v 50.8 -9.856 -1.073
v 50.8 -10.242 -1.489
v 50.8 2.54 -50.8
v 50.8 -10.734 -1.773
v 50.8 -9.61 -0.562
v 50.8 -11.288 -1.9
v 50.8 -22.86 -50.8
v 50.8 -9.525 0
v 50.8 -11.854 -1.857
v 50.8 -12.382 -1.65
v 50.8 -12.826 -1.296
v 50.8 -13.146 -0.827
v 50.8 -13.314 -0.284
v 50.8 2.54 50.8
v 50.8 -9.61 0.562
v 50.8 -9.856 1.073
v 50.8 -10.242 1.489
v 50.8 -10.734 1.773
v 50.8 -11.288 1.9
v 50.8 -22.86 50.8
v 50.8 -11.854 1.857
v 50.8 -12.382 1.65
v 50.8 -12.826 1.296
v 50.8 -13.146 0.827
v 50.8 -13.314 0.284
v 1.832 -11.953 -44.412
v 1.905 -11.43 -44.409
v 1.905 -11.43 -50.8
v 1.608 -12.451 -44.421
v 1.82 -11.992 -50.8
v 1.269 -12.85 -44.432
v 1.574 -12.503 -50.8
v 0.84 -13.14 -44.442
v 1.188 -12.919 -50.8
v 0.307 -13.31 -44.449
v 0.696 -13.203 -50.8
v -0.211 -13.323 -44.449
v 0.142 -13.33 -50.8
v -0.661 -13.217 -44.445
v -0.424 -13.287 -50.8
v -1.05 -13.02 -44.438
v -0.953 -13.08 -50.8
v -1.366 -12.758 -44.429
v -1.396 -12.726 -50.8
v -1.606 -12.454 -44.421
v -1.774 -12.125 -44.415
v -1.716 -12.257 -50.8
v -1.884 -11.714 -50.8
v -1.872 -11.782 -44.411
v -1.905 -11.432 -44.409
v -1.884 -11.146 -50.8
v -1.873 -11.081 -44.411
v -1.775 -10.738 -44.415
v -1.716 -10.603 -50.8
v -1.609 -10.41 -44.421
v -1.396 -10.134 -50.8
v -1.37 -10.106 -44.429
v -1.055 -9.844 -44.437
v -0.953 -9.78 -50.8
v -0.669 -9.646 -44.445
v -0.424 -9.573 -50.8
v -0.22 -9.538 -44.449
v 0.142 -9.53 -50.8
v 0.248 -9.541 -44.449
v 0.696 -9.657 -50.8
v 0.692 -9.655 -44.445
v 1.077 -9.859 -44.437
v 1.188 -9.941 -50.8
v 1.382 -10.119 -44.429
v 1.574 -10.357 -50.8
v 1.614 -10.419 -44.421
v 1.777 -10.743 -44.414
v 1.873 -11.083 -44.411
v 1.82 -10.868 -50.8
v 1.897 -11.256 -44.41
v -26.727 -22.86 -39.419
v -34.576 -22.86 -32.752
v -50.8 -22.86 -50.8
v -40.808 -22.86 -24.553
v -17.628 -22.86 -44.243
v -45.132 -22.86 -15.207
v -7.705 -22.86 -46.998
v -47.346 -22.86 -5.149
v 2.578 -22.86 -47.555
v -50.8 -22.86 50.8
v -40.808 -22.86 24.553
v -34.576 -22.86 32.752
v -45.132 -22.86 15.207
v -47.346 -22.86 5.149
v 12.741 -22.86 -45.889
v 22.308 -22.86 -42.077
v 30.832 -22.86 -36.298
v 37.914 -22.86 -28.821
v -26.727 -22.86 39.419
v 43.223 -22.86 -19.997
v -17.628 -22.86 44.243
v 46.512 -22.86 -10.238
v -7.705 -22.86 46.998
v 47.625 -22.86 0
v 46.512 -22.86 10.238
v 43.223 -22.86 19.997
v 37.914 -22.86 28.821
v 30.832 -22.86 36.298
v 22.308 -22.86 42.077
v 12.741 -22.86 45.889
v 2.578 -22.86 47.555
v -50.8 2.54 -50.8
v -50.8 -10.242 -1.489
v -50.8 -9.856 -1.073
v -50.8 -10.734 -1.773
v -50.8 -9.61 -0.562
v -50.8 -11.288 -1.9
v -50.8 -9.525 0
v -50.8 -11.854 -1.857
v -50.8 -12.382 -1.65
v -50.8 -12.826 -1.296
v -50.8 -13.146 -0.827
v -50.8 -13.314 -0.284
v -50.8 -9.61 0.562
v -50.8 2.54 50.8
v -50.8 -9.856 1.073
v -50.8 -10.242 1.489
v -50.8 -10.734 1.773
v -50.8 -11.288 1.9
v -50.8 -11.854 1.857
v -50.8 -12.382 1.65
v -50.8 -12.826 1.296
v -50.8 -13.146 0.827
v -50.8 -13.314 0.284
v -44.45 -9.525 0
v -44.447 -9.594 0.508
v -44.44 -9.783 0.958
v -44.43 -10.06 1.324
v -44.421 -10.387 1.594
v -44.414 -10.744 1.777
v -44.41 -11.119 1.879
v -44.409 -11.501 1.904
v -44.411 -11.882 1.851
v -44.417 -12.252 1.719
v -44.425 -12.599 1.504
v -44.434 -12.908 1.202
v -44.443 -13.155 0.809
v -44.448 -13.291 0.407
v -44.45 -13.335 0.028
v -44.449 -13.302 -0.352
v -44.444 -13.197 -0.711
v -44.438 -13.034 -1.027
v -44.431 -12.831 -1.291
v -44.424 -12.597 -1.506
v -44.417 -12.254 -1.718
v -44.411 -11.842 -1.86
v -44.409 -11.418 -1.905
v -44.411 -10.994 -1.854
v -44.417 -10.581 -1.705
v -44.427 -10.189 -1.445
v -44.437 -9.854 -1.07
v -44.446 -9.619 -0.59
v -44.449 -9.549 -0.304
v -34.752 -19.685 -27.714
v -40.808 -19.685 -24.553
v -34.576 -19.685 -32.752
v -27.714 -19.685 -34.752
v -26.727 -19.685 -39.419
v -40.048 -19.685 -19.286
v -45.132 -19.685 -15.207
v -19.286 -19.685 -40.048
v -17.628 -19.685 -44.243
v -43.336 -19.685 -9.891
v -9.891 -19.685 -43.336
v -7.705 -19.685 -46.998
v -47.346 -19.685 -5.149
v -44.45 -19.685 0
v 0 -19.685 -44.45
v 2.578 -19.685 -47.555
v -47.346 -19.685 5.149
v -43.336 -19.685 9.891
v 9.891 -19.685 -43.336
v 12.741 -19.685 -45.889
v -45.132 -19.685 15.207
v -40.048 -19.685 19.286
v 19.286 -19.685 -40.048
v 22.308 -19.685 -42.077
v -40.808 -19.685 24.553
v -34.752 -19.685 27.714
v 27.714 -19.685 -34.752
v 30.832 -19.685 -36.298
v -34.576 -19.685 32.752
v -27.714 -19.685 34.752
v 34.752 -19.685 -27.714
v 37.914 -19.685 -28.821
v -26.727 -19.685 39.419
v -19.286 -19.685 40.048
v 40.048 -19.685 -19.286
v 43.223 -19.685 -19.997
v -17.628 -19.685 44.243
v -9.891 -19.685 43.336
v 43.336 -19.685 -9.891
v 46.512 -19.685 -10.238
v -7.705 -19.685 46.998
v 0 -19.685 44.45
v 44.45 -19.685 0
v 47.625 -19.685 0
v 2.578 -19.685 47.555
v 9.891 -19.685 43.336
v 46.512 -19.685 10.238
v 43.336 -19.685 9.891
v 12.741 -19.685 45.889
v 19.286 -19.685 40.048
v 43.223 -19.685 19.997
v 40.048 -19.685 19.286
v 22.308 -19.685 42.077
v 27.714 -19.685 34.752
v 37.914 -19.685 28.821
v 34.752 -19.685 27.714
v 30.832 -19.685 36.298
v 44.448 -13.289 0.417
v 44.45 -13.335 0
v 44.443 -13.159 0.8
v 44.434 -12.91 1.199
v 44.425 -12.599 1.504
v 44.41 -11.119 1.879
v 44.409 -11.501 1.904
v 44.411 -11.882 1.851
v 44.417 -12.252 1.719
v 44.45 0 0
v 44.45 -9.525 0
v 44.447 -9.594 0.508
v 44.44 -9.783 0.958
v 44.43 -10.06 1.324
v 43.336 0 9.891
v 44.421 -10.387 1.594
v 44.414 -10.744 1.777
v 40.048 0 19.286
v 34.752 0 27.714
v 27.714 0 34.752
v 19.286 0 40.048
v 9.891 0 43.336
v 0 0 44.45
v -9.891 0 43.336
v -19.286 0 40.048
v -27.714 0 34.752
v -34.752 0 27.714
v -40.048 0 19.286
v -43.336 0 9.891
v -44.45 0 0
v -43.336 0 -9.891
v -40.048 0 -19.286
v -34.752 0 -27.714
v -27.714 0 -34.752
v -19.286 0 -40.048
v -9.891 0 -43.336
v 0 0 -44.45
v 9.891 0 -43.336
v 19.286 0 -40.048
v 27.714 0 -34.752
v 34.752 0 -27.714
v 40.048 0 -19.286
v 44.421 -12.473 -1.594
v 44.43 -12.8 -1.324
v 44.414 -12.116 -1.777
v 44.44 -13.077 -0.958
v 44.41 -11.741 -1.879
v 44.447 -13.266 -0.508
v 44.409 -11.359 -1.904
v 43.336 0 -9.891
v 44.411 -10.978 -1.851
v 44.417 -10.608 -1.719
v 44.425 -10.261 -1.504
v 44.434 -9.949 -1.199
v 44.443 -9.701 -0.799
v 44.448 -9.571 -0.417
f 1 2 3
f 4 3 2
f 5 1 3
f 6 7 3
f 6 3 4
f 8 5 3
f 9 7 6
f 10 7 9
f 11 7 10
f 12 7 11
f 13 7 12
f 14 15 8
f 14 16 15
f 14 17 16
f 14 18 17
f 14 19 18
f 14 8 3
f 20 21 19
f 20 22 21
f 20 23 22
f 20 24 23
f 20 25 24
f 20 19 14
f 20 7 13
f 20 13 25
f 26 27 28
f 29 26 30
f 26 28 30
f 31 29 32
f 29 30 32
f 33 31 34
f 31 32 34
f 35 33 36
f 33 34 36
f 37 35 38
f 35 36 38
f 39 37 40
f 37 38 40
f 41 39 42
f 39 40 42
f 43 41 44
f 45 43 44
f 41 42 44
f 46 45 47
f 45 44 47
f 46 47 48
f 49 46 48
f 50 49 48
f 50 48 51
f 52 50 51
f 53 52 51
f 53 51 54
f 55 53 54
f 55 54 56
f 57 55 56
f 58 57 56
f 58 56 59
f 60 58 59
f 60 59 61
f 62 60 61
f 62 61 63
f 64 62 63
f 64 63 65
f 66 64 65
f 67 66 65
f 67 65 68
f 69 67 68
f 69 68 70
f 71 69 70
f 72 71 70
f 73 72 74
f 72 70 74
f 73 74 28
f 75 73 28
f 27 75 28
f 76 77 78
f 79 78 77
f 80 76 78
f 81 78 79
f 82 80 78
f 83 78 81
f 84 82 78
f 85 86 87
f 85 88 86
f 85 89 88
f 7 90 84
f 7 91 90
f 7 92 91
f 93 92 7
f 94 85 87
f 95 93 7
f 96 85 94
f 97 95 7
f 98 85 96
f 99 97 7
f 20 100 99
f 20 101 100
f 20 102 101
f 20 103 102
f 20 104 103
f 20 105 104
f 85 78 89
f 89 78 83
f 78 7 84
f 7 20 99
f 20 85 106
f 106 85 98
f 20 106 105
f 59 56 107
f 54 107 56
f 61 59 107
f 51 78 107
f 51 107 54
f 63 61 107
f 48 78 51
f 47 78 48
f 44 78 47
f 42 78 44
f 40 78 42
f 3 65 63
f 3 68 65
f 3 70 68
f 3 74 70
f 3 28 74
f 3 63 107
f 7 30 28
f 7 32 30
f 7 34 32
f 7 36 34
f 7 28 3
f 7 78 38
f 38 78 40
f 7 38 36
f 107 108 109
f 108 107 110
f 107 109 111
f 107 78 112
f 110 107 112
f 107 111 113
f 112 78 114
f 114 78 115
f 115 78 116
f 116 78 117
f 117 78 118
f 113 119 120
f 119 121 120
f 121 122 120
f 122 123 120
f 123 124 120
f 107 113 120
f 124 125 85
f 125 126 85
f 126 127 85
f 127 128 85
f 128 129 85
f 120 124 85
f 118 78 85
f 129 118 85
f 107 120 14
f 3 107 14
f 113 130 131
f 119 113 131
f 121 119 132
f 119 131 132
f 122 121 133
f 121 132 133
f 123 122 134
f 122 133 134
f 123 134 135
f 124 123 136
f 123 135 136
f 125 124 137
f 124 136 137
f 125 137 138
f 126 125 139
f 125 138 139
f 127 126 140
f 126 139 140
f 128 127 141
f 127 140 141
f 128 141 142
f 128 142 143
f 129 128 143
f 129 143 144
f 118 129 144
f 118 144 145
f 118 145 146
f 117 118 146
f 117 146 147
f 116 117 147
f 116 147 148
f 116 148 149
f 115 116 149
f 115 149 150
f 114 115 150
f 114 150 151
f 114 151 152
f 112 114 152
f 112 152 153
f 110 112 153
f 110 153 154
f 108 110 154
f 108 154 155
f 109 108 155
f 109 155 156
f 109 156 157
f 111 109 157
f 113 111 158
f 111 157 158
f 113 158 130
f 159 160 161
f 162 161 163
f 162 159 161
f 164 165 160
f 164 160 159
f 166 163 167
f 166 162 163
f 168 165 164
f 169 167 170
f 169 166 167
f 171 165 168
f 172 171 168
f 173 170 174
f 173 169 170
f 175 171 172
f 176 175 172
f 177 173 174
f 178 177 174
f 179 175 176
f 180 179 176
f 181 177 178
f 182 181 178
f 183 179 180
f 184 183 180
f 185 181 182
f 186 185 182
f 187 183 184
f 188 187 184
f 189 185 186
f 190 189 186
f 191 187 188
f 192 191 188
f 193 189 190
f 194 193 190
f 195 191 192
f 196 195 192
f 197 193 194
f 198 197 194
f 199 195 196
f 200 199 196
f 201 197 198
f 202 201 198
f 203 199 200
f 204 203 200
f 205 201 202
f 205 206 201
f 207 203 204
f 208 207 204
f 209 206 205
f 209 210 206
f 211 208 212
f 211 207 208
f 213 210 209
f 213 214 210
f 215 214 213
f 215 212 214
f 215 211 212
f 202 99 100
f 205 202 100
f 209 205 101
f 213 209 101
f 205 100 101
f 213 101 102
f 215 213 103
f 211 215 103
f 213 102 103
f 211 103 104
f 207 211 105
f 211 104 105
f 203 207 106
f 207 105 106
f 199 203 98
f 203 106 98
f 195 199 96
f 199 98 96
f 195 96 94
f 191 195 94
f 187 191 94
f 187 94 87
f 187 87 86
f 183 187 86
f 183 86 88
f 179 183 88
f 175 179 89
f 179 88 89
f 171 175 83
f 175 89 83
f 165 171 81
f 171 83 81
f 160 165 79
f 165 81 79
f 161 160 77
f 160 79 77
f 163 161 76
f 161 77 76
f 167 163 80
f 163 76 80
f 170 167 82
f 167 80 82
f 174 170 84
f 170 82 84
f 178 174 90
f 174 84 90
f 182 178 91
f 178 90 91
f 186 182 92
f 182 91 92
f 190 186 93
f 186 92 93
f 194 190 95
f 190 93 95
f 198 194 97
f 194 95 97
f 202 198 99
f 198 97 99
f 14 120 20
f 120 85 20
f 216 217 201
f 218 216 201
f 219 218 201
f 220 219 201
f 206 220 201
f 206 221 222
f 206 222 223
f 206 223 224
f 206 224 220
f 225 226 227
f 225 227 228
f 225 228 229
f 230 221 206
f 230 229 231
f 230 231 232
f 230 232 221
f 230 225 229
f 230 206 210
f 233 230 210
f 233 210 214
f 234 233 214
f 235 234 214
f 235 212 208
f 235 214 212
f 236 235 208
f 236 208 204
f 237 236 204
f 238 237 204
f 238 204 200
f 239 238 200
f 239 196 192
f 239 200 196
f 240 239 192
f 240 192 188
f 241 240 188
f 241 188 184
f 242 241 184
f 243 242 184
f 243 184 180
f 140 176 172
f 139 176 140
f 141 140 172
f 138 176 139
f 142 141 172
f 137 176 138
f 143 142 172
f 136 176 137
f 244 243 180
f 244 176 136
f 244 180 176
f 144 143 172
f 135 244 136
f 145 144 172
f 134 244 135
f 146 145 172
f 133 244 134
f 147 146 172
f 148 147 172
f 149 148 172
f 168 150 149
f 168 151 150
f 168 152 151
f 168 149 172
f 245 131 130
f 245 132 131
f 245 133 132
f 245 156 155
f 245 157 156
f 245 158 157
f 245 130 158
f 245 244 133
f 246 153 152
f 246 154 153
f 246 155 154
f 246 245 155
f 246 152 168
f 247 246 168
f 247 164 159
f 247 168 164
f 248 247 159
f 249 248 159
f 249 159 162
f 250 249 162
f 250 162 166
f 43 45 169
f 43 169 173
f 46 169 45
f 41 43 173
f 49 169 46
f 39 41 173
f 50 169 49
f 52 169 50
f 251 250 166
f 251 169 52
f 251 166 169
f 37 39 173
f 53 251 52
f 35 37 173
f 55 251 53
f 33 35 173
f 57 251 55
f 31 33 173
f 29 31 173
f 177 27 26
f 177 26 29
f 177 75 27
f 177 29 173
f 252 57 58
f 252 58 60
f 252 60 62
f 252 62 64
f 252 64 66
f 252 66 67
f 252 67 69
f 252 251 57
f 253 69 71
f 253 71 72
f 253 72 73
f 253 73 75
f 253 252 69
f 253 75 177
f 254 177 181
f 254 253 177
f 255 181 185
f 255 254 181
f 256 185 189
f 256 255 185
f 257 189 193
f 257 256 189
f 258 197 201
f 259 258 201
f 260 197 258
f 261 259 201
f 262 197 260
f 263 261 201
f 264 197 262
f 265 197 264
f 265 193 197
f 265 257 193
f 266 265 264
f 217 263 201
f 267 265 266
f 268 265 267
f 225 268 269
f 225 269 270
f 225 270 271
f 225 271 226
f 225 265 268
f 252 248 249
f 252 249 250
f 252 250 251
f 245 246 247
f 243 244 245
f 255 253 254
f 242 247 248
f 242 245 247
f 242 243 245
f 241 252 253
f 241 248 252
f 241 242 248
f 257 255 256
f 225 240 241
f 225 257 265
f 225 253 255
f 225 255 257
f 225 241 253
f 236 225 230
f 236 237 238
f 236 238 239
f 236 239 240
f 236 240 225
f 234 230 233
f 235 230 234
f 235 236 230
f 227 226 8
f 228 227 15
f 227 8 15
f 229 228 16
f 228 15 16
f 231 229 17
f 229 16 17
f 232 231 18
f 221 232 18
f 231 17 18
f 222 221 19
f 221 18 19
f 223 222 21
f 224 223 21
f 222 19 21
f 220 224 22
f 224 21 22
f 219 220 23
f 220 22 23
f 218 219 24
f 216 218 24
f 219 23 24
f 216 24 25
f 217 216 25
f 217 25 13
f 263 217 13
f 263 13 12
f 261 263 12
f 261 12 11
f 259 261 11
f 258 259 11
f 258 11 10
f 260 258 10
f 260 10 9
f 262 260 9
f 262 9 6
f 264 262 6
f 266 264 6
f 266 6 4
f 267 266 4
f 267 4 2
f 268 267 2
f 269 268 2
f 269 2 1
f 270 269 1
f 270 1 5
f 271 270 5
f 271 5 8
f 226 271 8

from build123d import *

# Parameters (mm, degrees)
F0_W     = 101.6
F0_H     = 101.6
F0_R     = 44.45
F1_DEPTH = 22.86
F3_R     = 1.905
F4_DEPTH = 101.601
F2_R     = 1.905
F5_DEPTH = 6.3918402903
F6_W     = 101.6
F6_H     = 101.6
F7_DEPTH = 2.54
F8_R     = 47.625
F9_DEPTH = 3.175


with BuildPart() as f1:
    # F0 (on Front) → F1 (new body)
    with BuildSketch(Plane.XZ):
        Rectangle(F0_W, F0_H)
        Circle(F0_R, mode=Mode.SUBTRACT)
    extrude(amount=F1_DEPTH)

    # F3 (on face) → F4 (cut, through all)
    with BuildSketch(Plane.YZ.offset(50.8)):
        with Locations((-11.43, 0)):
            Circle(F3_R)
    extrude(amount=-F4_DEPTH, mode=Mode.SUBTRACT)

    # F2 (on face) → F5 (cut, through all)
    with BuildSketch(Plane(origin=(0, 0, -50.8), x_dir=(1, 0, 0), z_dir=(0, 0, -1))):
        with Locations((0, 11.43)):
            Circle(F2_R)
    extrude(amount=-F5_DEPTH, mode=Mode.SUBTRACT)

    # F6 (on Front) → F7 (join)
    with BuildSketch(Plane.XZ):
        Rectangle(F6_W, F6_H)
    extrude(amount=-F7_DEPTH)

    # F8 (on face) → F9 (cut)
    with BuildSketch(Plane.XZ.offset(22.86)):
        Circle(F8_R)
    extrude(amount=-F9_DEPTH, mode=Mode.SUBTRACT)


solid = f1.part
